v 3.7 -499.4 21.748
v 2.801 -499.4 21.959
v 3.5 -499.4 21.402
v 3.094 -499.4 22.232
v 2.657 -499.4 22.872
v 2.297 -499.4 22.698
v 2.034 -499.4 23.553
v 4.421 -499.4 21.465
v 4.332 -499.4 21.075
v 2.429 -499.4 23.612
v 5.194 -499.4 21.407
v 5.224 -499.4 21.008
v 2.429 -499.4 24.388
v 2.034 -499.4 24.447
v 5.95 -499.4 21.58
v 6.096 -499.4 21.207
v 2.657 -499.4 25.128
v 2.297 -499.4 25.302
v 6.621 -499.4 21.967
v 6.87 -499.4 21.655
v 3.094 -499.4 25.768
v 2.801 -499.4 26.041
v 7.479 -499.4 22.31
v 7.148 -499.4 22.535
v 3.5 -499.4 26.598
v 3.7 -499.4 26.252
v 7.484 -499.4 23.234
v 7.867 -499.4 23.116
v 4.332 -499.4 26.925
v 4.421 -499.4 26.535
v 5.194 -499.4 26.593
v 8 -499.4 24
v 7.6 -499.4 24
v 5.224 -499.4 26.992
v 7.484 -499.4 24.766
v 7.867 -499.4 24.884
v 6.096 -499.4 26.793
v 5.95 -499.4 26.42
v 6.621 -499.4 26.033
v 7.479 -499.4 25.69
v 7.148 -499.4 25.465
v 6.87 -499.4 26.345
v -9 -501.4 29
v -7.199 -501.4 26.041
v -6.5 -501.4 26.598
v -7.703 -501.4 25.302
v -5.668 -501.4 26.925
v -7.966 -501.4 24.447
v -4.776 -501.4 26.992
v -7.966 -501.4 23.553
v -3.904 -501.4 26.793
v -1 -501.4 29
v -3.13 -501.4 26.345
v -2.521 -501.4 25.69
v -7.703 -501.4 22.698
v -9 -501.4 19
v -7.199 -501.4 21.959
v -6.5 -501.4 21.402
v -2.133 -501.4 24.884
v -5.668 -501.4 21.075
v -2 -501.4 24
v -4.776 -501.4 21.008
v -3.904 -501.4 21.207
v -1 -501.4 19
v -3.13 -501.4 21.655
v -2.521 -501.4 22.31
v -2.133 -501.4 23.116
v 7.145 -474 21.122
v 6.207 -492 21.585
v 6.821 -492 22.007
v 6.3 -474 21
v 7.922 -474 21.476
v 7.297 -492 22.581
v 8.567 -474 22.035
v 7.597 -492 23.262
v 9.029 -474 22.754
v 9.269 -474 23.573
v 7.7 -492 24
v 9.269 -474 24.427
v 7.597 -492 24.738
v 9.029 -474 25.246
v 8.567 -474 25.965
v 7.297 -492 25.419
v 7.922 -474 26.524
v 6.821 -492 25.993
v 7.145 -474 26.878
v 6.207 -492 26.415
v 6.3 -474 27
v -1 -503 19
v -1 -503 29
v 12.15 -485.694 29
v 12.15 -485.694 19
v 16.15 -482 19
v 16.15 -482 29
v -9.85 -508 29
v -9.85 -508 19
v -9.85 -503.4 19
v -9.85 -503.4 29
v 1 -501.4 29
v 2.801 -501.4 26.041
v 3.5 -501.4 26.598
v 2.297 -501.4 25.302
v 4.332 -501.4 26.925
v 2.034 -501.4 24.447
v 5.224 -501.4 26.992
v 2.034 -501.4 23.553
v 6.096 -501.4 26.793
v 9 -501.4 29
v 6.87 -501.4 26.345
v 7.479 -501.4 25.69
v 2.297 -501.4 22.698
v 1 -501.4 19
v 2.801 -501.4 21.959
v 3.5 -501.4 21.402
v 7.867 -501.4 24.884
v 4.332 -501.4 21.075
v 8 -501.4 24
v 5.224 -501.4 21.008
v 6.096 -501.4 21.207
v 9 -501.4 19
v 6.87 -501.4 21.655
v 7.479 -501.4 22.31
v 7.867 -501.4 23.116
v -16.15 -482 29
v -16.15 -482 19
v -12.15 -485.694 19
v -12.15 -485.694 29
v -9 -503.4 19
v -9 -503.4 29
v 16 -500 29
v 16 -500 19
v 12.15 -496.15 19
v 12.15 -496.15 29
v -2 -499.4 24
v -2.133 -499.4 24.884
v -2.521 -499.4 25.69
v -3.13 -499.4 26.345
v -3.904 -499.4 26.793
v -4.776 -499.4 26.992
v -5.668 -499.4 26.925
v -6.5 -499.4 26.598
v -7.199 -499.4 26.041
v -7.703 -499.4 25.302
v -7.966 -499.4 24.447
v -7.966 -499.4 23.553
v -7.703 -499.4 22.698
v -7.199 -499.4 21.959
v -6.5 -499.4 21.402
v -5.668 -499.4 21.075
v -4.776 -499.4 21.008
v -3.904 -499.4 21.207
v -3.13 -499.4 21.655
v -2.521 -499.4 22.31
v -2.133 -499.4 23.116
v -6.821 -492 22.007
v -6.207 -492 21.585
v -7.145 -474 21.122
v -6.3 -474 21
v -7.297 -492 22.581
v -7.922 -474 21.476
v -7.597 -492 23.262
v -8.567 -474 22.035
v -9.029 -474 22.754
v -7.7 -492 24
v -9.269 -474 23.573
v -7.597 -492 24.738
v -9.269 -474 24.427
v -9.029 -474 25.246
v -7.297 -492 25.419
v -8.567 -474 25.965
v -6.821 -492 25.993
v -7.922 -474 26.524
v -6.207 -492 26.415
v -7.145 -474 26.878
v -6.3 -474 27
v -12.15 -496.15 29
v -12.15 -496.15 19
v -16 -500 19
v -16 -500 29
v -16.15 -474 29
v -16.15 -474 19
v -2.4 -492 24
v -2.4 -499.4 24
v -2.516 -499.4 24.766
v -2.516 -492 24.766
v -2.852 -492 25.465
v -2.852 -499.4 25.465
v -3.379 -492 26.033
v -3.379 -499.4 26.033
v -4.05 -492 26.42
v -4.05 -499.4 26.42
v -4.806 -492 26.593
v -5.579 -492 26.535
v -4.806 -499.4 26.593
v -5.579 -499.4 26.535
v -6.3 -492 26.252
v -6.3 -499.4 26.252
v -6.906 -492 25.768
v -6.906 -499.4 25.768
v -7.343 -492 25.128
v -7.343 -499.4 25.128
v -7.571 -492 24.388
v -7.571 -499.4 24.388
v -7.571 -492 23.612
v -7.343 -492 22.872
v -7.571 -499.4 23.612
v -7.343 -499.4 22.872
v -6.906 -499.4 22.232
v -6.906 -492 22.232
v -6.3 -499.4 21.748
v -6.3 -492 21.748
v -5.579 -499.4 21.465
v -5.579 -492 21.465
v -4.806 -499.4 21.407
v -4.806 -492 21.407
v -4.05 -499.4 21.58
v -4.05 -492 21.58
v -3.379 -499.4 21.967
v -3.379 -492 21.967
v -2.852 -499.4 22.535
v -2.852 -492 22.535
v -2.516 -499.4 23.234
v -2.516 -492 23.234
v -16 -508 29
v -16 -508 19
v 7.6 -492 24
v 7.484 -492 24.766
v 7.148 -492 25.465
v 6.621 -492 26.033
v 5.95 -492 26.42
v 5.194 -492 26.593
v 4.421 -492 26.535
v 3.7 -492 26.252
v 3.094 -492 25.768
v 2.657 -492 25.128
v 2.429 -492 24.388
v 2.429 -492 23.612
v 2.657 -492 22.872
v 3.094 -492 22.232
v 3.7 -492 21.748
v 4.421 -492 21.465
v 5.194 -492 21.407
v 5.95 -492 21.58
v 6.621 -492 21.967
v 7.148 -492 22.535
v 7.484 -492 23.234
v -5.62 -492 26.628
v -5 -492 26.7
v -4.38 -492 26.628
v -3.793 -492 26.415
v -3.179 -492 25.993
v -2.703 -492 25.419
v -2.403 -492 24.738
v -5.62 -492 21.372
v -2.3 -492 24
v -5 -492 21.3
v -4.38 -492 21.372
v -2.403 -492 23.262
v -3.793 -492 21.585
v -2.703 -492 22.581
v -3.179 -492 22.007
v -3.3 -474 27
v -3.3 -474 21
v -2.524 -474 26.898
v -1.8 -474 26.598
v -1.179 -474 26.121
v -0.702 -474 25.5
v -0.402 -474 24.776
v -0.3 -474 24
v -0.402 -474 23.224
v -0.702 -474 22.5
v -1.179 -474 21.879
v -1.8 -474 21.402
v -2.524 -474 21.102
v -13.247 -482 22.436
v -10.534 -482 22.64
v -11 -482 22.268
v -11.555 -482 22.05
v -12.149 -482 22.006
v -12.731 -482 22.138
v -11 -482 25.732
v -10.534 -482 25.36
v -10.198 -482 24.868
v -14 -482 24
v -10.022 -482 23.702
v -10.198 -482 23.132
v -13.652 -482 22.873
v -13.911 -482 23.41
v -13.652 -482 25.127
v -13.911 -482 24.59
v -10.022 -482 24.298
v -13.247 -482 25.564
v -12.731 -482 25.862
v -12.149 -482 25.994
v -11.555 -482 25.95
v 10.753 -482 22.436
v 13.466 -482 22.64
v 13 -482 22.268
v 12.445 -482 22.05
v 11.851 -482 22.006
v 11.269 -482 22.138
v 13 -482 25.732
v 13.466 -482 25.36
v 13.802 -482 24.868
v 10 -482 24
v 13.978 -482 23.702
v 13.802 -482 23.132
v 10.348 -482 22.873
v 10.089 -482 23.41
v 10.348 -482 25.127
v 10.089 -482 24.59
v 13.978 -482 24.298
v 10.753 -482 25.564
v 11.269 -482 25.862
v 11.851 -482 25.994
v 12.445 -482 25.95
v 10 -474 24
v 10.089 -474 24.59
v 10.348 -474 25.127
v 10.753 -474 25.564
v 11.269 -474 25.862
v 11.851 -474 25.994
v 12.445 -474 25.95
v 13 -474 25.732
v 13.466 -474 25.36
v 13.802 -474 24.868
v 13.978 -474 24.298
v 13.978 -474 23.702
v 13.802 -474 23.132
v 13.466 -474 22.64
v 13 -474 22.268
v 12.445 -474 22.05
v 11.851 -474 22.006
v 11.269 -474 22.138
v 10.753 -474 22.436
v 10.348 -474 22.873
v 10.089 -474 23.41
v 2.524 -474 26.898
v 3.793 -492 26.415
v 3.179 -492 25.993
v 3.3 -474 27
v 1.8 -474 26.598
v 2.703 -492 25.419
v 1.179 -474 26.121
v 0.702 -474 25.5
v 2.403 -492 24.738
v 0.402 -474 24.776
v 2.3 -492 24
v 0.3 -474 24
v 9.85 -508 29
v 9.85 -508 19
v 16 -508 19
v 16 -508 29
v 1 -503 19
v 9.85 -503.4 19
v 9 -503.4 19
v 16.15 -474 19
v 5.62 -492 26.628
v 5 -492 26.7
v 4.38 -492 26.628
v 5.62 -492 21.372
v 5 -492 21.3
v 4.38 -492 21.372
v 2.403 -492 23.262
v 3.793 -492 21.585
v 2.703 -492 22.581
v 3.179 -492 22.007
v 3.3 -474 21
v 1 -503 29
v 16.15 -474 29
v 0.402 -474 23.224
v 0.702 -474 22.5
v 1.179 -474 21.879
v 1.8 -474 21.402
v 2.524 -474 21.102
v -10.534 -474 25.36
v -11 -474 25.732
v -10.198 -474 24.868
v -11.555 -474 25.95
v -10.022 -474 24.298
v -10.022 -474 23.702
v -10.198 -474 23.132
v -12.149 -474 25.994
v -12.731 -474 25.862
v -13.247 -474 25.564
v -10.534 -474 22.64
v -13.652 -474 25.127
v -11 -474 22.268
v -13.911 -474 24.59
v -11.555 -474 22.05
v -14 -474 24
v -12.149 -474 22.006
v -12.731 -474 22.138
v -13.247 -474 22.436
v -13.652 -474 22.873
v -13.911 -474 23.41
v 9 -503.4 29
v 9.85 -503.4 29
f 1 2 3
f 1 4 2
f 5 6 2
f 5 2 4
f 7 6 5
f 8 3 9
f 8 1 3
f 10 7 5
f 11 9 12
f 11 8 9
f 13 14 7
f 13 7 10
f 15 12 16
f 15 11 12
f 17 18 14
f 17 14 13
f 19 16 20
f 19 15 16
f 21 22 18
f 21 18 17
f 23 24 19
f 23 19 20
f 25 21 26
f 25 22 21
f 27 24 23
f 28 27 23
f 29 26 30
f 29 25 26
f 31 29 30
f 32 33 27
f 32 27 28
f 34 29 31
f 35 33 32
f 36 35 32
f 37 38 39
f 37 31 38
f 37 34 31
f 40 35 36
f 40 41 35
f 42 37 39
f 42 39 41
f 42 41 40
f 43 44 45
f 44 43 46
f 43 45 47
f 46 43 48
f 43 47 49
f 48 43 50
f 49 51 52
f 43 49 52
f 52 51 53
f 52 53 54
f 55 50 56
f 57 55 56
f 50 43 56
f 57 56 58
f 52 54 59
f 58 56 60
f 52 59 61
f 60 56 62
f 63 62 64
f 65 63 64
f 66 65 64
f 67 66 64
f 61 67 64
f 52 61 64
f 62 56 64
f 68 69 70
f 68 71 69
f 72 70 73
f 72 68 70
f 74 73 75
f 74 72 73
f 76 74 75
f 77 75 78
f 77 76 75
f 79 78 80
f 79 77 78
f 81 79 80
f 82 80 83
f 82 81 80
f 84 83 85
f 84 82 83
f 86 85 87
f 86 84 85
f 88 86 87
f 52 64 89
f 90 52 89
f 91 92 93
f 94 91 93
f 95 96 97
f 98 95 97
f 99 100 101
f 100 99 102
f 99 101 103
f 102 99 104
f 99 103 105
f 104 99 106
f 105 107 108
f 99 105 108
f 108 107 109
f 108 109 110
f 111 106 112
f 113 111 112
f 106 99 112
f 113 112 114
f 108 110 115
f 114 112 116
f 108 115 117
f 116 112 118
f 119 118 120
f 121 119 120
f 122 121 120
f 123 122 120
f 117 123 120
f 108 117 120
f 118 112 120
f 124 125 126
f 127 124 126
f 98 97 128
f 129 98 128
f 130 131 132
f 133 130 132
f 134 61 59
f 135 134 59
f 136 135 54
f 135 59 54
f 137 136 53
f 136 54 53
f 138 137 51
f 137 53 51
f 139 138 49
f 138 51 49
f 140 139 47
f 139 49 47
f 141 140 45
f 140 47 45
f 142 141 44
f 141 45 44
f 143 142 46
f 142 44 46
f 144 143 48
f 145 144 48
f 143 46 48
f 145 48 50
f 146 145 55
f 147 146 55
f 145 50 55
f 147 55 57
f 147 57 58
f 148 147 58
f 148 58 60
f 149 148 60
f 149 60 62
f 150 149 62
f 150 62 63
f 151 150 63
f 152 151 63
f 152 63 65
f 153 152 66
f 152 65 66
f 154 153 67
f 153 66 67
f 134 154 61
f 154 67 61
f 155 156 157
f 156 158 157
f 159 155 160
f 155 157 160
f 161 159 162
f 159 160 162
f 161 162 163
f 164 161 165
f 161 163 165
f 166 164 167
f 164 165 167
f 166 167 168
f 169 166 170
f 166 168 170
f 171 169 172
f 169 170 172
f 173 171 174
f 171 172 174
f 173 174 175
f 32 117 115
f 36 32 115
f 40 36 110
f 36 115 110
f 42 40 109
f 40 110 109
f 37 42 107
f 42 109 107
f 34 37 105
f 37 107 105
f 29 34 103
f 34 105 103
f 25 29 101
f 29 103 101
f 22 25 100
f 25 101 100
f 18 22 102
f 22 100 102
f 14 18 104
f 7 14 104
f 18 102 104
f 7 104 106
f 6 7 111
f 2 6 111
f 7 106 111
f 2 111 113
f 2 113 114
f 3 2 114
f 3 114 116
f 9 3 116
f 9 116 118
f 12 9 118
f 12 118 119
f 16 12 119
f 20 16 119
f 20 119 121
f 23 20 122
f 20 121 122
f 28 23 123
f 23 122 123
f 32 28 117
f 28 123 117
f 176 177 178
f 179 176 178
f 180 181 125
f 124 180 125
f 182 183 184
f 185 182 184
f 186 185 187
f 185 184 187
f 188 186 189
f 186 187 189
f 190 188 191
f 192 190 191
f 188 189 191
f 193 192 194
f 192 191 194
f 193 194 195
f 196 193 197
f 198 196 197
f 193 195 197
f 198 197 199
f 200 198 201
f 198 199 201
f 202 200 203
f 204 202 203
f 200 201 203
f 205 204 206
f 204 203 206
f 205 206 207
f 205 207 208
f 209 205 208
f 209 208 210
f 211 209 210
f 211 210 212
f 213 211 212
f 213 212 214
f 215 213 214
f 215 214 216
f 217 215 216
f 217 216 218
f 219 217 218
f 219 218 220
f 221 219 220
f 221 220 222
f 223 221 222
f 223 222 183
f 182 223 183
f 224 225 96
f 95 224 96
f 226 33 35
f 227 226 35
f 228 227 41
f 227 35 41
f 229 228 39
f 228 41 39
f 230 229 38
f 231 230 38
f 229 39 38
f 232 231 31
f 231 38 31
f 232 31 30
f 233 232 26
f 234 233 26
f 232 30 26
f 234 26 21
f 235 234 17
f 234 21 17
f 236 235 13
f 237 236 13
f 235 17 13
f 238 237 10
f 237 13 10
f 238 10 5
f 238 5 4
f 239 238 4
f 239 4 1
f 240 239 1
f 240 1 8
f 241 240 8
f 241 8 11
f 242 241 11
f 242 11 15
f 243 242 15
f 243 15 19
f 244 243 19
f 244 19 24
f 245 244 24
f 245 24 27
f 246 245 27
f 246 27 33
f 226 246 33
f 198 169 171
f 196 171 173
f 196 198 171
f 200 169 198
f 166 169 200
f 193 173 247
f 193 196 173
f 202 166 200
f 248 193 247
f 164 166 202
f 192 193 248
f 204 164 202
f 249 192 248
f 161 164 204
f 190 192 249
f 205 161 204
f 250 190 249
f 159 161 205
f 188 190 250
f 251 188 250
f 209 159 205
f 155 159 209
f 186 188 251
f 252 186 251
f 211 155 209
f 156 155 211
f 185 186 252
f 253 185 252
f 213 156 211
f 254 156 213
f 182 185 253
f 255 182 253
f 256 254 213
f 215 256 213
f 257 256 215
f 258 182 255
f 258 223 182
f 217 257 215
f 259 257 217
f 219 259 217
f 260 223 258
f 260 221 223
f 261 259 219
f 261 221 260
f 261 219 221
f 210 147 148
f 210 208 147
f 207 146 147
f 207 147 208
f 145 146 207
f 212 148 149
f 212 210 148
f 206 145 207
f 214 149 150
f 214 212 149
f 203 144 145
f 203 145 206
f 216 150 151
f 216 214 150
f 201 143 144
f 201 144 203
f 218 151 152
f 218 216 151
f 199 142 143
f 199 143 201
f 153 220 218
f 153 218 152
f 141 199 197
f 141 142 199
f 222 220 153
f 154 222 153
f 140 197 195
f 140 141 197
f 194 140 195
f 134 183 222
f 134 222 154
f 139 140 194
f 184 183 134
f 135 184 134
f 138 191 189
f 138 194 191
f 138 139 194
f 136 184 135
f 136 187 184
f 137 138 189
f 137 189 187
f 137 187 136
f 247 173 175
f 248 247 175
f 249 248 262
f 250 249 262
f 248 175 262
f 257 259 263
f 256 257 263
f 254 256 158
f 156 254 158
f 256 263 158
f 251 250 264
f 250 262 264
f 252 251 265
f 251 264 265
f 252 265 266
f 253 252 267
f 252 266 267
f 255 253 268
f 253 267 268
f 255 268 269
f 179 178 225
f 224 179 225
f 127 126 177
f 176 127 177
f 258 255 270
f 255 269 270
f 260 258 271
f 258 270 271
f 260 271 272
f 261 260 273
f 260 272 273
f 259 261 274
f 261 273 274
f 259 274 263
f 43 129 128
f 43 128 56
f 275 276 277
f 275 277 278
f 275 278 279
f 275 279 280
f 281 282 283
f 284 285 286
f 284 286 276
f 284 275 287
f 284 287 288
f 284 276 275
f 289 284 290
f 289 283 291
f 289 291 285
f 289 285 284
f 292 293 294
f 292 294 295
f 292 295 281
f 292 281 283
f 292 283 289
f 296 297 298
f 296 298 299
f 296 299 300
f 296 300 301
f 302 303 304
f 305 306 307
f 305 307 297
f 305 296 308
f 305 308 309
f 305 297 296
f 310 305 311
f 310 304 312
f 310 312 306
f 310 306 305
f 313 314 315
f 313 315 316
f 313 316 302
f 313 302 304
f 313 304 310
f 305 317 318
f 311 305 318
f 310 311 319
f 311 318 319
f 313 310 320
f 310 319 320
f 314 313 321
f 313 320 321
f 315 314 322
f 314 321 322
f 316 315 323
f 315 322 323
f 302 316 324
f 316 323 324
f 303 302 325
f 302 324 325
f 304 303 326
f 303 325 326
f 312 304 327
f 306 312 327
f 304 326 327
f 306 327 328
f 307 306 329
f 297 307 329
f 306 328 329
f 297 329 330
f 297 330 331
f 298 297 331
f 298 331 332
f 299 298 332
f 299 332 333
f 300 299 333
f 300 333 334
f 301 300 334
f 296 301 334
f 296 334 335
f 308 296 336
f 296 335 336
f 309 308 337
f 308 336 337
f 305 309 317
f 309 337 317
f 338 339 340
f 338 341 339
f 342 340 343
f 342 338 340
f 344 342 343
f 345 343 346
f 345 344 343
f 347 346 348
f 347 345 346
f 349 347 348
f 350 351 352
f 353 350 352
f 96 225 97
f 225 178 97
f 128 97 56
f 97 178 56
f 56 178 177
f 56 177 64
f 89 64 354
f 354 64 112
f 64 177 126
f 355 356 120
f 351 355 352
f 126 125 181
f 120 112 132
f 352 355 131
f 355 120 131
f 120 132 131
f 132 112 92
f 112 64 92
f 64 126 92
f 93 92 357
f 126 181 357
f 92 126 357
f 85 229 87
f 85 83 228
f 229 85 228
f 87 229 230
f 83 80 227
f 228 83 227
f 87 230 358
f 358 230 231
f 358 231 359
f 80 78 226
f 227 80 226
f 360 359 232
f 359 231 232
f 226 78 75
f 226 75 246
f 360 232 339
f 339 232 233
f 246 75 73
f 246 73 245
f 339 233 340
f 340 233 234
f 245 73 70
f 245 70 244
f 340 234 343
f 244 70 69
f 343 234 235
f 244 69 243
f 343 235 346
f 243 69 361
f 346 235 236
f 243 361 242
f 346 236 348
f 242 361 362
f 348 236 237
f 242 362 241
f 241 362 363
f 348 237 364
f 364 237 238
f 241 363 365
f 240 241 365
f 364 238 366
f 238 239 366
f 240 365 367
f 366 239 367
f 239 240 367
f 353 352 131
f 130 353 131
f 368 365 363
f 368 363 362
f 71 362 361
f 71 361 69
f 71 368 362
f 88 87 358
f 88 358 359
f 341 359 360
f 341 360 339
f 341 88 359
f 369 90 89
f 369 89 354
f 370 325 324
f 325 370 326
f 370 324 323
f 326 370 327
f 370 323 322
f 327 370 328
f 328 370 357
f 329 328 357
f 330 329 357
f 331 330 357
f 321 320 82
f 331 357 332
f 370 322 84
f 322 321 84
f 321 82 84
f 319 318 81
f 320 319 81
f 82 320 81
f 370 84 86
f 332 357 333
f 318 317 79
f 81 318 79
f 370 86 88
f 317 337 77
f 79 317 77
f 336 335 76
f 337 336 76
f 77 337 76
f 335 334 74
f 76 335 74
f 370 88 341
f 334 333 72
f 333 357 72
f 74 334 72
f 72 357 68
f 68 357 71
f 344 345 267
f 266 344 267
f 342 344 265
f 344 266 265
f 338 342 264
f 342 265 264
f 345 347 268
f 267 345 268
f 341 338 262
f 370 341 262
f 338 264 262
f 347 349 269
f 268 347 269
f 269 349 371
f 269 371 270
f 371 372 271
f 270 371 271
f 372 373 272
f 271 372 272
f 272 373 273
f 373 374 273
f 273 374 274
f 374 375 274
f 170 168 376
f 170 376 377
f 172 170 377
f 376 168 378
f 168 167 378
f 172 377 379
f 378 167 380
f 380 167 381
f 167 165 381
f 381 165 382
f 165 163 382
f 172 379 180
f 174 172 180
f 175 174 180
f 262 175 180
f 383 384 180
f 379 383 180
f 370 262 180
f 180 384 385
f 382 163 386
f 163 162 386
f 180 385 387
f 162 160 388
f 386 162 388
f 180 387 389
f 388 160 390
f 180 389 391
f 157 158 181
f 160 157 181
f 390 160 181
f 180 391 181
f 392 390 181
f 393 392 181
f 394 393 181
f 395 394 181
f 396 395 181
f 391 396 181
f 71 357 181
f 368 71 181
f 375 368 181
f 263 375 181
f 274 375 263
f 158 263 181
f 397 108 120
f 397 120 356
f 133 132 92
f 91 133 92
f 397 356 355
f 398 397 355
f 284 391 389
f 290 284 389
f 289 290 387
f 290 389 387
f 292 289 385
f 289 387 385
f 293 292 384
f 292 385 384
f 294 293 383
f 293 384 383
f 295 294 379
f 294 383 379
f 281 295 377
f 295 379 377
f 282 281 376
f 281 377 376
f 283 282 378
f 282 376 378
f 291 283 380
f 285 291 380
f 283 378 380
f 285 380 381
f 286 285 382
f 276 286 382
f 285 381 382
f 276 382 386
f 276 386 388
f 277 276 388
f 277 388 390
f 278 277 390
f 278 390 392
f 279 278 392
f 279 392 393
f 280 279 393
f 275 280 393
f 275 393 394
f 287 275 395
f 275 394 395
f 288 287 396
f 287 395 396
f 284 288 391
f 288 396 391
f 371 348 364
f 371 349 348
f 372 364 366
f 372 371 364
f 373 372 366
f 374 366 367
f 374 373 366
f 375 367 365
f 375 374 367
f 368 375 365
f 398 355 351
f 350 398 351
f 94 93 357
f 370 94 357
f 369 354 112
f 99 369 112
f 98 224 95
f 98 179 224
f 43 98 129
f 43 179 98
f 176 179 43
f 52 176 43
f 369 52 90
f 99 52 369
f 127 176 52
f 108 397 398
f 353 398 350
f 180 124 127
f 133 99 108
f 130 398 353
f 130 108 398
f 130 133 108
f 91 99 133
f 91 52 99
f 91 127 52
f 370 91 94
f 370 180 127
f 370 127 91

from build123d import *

# Parameters (mm, degrees)
SKETCH072_R            = 2.7
PAD031_DEPTH           = 10
SKETCH069_R            = 2.6
POCKET028_DEPTH        = 10
SKETCH070_R            = 3
POCKET029_DEPTH        = 2
SKETCH073_R            = 2
POCKET030_DEPTH        = 8
CUT003_PLACEMENT_ANGLE = 90


with BuildPart() as loft004:
    # Sketch072 → Loft004 section 0
    with BuildSketch(Plane.XY.offset(20)):
        with Locations((-5, 0)):
            Circle(SKETCH072_R)
    # Sketch071 → Loft004 section 1
    with BuildSketch(Plane.XY.offset(38)):
        with BuildLine():
            ThreePointArc((-6.3, 3), (-9.3, 0), (-6.3, -3))
            Line((-6.3, -3), (-3.3, -3))
            ThreePointArc((-3.3, -3), (-0.3, 0), (-3.3, 3))
            Line((-3.3, 3), (-6.3, 3))
        make_face()
    loft()


with BuildPart() as part_mirroring004:
    # Part__Mirroring004: instance of Loft004
    add(loft004.part.mirror(Plane(origin=(0, 0, 0), x_dir=(0, -1, 0), z_dir=(1, 0, 0))))


with BuildPart() as fusion004:
    # Fusion004 base: copy of Loft004
    add(loft004.part)

    # Fusion004: union Part__Mirroring004
    add(part_mirroring004.part)


with BuildPart() as cut003:
    # Sketch068 → Pad031 (new body)
    with BuildSketch(Plane.XZ):
        Polygon((-16, 4), (-9.85, 4), (-9.85, 7), (-9.85, 8.6), (-9, 8.6), (-9, 10.6), (-1, 10.6), (-1, 9), (1, 9), (1, 10.6), (9, 10.6), (9, 8.6), (9.85, 8.6), (9.85, 7), (9.85, 4), (16, 4), (16, 12), (12.15, 15.85), (12.15, 26.306086), (16.15, 30), (16.15, 38), (-16.15, 38), (-16.15, 30), (-12.15, 26.306086), (-12.15, 15.85), (-16, 12), align=None)
    extrude(amount=PAD031_DEPTH)

    # Sketch069 (on Face7 of Pad031) → Pocket028 (cut)
    with BuildSketch(Plane(origin=(0, 0, 10.6), x_dir=(1, 0, 0), z_dir=(0, 0, -1))):
        with Locations((-5, 5)):
            Circle(SKETCH069_R)
        with Locations((5, 5)):
            Circle(SKETCH069_R)
    extrude(amount=-POCKET028_DEPTH, mode=Mode.SUBTRACT)

    # Sketch070 (on Face11 of Pocket028) → Pocket029 (cut)
    with BuildSketch(Plane(origin=(0, 0, 10.6), x_dir=(1, 0, 0), z_dir=(0, 0, -1))):
        with Locations((-5, 5)):
            Circle(SKETCH070_R)
        with Locations((5, 5)):
            Circle(SKETCH070_R)
    extrude(amount=-POCKET029_DEPTH, mode=Mode.SUBTRACT)

    # Sketch073 (on Face26 of Pocket029) → Pocket030 (cut)
    with BuildSketch(Plane(origin=(0, 0, 38), x_dir=(-1, 0, 0), z_dir=(0, 0, 1))):
        with Locations((-12, 5)):
            Circle(SKETCH073_R)
        with Locations((12, 5)):
            Circle(SKETCH073_R)
    extrude(amount=-POCKET030_DEPTH, mode=Mode.SUBTRACT)


with BuildPart() as cut003_1:
    # Body025 placement: moved
    add(cut003.part.moved(Location((0, 5, 0))))

    # Cut003: cut Fusion004
    add(fusion004.part, mode=Mode.SUBTRACT)


with BuildPart() as cut003_2:
    # Cut003 placement: moved
    add(cut003_1.part.moved(Location((0, -512, 24))).rotate(Axis((0, -512, 24), (-1, 0, 0)), CUT003_PLACEMENT_ANGLE))


solid = cut003_2.part
